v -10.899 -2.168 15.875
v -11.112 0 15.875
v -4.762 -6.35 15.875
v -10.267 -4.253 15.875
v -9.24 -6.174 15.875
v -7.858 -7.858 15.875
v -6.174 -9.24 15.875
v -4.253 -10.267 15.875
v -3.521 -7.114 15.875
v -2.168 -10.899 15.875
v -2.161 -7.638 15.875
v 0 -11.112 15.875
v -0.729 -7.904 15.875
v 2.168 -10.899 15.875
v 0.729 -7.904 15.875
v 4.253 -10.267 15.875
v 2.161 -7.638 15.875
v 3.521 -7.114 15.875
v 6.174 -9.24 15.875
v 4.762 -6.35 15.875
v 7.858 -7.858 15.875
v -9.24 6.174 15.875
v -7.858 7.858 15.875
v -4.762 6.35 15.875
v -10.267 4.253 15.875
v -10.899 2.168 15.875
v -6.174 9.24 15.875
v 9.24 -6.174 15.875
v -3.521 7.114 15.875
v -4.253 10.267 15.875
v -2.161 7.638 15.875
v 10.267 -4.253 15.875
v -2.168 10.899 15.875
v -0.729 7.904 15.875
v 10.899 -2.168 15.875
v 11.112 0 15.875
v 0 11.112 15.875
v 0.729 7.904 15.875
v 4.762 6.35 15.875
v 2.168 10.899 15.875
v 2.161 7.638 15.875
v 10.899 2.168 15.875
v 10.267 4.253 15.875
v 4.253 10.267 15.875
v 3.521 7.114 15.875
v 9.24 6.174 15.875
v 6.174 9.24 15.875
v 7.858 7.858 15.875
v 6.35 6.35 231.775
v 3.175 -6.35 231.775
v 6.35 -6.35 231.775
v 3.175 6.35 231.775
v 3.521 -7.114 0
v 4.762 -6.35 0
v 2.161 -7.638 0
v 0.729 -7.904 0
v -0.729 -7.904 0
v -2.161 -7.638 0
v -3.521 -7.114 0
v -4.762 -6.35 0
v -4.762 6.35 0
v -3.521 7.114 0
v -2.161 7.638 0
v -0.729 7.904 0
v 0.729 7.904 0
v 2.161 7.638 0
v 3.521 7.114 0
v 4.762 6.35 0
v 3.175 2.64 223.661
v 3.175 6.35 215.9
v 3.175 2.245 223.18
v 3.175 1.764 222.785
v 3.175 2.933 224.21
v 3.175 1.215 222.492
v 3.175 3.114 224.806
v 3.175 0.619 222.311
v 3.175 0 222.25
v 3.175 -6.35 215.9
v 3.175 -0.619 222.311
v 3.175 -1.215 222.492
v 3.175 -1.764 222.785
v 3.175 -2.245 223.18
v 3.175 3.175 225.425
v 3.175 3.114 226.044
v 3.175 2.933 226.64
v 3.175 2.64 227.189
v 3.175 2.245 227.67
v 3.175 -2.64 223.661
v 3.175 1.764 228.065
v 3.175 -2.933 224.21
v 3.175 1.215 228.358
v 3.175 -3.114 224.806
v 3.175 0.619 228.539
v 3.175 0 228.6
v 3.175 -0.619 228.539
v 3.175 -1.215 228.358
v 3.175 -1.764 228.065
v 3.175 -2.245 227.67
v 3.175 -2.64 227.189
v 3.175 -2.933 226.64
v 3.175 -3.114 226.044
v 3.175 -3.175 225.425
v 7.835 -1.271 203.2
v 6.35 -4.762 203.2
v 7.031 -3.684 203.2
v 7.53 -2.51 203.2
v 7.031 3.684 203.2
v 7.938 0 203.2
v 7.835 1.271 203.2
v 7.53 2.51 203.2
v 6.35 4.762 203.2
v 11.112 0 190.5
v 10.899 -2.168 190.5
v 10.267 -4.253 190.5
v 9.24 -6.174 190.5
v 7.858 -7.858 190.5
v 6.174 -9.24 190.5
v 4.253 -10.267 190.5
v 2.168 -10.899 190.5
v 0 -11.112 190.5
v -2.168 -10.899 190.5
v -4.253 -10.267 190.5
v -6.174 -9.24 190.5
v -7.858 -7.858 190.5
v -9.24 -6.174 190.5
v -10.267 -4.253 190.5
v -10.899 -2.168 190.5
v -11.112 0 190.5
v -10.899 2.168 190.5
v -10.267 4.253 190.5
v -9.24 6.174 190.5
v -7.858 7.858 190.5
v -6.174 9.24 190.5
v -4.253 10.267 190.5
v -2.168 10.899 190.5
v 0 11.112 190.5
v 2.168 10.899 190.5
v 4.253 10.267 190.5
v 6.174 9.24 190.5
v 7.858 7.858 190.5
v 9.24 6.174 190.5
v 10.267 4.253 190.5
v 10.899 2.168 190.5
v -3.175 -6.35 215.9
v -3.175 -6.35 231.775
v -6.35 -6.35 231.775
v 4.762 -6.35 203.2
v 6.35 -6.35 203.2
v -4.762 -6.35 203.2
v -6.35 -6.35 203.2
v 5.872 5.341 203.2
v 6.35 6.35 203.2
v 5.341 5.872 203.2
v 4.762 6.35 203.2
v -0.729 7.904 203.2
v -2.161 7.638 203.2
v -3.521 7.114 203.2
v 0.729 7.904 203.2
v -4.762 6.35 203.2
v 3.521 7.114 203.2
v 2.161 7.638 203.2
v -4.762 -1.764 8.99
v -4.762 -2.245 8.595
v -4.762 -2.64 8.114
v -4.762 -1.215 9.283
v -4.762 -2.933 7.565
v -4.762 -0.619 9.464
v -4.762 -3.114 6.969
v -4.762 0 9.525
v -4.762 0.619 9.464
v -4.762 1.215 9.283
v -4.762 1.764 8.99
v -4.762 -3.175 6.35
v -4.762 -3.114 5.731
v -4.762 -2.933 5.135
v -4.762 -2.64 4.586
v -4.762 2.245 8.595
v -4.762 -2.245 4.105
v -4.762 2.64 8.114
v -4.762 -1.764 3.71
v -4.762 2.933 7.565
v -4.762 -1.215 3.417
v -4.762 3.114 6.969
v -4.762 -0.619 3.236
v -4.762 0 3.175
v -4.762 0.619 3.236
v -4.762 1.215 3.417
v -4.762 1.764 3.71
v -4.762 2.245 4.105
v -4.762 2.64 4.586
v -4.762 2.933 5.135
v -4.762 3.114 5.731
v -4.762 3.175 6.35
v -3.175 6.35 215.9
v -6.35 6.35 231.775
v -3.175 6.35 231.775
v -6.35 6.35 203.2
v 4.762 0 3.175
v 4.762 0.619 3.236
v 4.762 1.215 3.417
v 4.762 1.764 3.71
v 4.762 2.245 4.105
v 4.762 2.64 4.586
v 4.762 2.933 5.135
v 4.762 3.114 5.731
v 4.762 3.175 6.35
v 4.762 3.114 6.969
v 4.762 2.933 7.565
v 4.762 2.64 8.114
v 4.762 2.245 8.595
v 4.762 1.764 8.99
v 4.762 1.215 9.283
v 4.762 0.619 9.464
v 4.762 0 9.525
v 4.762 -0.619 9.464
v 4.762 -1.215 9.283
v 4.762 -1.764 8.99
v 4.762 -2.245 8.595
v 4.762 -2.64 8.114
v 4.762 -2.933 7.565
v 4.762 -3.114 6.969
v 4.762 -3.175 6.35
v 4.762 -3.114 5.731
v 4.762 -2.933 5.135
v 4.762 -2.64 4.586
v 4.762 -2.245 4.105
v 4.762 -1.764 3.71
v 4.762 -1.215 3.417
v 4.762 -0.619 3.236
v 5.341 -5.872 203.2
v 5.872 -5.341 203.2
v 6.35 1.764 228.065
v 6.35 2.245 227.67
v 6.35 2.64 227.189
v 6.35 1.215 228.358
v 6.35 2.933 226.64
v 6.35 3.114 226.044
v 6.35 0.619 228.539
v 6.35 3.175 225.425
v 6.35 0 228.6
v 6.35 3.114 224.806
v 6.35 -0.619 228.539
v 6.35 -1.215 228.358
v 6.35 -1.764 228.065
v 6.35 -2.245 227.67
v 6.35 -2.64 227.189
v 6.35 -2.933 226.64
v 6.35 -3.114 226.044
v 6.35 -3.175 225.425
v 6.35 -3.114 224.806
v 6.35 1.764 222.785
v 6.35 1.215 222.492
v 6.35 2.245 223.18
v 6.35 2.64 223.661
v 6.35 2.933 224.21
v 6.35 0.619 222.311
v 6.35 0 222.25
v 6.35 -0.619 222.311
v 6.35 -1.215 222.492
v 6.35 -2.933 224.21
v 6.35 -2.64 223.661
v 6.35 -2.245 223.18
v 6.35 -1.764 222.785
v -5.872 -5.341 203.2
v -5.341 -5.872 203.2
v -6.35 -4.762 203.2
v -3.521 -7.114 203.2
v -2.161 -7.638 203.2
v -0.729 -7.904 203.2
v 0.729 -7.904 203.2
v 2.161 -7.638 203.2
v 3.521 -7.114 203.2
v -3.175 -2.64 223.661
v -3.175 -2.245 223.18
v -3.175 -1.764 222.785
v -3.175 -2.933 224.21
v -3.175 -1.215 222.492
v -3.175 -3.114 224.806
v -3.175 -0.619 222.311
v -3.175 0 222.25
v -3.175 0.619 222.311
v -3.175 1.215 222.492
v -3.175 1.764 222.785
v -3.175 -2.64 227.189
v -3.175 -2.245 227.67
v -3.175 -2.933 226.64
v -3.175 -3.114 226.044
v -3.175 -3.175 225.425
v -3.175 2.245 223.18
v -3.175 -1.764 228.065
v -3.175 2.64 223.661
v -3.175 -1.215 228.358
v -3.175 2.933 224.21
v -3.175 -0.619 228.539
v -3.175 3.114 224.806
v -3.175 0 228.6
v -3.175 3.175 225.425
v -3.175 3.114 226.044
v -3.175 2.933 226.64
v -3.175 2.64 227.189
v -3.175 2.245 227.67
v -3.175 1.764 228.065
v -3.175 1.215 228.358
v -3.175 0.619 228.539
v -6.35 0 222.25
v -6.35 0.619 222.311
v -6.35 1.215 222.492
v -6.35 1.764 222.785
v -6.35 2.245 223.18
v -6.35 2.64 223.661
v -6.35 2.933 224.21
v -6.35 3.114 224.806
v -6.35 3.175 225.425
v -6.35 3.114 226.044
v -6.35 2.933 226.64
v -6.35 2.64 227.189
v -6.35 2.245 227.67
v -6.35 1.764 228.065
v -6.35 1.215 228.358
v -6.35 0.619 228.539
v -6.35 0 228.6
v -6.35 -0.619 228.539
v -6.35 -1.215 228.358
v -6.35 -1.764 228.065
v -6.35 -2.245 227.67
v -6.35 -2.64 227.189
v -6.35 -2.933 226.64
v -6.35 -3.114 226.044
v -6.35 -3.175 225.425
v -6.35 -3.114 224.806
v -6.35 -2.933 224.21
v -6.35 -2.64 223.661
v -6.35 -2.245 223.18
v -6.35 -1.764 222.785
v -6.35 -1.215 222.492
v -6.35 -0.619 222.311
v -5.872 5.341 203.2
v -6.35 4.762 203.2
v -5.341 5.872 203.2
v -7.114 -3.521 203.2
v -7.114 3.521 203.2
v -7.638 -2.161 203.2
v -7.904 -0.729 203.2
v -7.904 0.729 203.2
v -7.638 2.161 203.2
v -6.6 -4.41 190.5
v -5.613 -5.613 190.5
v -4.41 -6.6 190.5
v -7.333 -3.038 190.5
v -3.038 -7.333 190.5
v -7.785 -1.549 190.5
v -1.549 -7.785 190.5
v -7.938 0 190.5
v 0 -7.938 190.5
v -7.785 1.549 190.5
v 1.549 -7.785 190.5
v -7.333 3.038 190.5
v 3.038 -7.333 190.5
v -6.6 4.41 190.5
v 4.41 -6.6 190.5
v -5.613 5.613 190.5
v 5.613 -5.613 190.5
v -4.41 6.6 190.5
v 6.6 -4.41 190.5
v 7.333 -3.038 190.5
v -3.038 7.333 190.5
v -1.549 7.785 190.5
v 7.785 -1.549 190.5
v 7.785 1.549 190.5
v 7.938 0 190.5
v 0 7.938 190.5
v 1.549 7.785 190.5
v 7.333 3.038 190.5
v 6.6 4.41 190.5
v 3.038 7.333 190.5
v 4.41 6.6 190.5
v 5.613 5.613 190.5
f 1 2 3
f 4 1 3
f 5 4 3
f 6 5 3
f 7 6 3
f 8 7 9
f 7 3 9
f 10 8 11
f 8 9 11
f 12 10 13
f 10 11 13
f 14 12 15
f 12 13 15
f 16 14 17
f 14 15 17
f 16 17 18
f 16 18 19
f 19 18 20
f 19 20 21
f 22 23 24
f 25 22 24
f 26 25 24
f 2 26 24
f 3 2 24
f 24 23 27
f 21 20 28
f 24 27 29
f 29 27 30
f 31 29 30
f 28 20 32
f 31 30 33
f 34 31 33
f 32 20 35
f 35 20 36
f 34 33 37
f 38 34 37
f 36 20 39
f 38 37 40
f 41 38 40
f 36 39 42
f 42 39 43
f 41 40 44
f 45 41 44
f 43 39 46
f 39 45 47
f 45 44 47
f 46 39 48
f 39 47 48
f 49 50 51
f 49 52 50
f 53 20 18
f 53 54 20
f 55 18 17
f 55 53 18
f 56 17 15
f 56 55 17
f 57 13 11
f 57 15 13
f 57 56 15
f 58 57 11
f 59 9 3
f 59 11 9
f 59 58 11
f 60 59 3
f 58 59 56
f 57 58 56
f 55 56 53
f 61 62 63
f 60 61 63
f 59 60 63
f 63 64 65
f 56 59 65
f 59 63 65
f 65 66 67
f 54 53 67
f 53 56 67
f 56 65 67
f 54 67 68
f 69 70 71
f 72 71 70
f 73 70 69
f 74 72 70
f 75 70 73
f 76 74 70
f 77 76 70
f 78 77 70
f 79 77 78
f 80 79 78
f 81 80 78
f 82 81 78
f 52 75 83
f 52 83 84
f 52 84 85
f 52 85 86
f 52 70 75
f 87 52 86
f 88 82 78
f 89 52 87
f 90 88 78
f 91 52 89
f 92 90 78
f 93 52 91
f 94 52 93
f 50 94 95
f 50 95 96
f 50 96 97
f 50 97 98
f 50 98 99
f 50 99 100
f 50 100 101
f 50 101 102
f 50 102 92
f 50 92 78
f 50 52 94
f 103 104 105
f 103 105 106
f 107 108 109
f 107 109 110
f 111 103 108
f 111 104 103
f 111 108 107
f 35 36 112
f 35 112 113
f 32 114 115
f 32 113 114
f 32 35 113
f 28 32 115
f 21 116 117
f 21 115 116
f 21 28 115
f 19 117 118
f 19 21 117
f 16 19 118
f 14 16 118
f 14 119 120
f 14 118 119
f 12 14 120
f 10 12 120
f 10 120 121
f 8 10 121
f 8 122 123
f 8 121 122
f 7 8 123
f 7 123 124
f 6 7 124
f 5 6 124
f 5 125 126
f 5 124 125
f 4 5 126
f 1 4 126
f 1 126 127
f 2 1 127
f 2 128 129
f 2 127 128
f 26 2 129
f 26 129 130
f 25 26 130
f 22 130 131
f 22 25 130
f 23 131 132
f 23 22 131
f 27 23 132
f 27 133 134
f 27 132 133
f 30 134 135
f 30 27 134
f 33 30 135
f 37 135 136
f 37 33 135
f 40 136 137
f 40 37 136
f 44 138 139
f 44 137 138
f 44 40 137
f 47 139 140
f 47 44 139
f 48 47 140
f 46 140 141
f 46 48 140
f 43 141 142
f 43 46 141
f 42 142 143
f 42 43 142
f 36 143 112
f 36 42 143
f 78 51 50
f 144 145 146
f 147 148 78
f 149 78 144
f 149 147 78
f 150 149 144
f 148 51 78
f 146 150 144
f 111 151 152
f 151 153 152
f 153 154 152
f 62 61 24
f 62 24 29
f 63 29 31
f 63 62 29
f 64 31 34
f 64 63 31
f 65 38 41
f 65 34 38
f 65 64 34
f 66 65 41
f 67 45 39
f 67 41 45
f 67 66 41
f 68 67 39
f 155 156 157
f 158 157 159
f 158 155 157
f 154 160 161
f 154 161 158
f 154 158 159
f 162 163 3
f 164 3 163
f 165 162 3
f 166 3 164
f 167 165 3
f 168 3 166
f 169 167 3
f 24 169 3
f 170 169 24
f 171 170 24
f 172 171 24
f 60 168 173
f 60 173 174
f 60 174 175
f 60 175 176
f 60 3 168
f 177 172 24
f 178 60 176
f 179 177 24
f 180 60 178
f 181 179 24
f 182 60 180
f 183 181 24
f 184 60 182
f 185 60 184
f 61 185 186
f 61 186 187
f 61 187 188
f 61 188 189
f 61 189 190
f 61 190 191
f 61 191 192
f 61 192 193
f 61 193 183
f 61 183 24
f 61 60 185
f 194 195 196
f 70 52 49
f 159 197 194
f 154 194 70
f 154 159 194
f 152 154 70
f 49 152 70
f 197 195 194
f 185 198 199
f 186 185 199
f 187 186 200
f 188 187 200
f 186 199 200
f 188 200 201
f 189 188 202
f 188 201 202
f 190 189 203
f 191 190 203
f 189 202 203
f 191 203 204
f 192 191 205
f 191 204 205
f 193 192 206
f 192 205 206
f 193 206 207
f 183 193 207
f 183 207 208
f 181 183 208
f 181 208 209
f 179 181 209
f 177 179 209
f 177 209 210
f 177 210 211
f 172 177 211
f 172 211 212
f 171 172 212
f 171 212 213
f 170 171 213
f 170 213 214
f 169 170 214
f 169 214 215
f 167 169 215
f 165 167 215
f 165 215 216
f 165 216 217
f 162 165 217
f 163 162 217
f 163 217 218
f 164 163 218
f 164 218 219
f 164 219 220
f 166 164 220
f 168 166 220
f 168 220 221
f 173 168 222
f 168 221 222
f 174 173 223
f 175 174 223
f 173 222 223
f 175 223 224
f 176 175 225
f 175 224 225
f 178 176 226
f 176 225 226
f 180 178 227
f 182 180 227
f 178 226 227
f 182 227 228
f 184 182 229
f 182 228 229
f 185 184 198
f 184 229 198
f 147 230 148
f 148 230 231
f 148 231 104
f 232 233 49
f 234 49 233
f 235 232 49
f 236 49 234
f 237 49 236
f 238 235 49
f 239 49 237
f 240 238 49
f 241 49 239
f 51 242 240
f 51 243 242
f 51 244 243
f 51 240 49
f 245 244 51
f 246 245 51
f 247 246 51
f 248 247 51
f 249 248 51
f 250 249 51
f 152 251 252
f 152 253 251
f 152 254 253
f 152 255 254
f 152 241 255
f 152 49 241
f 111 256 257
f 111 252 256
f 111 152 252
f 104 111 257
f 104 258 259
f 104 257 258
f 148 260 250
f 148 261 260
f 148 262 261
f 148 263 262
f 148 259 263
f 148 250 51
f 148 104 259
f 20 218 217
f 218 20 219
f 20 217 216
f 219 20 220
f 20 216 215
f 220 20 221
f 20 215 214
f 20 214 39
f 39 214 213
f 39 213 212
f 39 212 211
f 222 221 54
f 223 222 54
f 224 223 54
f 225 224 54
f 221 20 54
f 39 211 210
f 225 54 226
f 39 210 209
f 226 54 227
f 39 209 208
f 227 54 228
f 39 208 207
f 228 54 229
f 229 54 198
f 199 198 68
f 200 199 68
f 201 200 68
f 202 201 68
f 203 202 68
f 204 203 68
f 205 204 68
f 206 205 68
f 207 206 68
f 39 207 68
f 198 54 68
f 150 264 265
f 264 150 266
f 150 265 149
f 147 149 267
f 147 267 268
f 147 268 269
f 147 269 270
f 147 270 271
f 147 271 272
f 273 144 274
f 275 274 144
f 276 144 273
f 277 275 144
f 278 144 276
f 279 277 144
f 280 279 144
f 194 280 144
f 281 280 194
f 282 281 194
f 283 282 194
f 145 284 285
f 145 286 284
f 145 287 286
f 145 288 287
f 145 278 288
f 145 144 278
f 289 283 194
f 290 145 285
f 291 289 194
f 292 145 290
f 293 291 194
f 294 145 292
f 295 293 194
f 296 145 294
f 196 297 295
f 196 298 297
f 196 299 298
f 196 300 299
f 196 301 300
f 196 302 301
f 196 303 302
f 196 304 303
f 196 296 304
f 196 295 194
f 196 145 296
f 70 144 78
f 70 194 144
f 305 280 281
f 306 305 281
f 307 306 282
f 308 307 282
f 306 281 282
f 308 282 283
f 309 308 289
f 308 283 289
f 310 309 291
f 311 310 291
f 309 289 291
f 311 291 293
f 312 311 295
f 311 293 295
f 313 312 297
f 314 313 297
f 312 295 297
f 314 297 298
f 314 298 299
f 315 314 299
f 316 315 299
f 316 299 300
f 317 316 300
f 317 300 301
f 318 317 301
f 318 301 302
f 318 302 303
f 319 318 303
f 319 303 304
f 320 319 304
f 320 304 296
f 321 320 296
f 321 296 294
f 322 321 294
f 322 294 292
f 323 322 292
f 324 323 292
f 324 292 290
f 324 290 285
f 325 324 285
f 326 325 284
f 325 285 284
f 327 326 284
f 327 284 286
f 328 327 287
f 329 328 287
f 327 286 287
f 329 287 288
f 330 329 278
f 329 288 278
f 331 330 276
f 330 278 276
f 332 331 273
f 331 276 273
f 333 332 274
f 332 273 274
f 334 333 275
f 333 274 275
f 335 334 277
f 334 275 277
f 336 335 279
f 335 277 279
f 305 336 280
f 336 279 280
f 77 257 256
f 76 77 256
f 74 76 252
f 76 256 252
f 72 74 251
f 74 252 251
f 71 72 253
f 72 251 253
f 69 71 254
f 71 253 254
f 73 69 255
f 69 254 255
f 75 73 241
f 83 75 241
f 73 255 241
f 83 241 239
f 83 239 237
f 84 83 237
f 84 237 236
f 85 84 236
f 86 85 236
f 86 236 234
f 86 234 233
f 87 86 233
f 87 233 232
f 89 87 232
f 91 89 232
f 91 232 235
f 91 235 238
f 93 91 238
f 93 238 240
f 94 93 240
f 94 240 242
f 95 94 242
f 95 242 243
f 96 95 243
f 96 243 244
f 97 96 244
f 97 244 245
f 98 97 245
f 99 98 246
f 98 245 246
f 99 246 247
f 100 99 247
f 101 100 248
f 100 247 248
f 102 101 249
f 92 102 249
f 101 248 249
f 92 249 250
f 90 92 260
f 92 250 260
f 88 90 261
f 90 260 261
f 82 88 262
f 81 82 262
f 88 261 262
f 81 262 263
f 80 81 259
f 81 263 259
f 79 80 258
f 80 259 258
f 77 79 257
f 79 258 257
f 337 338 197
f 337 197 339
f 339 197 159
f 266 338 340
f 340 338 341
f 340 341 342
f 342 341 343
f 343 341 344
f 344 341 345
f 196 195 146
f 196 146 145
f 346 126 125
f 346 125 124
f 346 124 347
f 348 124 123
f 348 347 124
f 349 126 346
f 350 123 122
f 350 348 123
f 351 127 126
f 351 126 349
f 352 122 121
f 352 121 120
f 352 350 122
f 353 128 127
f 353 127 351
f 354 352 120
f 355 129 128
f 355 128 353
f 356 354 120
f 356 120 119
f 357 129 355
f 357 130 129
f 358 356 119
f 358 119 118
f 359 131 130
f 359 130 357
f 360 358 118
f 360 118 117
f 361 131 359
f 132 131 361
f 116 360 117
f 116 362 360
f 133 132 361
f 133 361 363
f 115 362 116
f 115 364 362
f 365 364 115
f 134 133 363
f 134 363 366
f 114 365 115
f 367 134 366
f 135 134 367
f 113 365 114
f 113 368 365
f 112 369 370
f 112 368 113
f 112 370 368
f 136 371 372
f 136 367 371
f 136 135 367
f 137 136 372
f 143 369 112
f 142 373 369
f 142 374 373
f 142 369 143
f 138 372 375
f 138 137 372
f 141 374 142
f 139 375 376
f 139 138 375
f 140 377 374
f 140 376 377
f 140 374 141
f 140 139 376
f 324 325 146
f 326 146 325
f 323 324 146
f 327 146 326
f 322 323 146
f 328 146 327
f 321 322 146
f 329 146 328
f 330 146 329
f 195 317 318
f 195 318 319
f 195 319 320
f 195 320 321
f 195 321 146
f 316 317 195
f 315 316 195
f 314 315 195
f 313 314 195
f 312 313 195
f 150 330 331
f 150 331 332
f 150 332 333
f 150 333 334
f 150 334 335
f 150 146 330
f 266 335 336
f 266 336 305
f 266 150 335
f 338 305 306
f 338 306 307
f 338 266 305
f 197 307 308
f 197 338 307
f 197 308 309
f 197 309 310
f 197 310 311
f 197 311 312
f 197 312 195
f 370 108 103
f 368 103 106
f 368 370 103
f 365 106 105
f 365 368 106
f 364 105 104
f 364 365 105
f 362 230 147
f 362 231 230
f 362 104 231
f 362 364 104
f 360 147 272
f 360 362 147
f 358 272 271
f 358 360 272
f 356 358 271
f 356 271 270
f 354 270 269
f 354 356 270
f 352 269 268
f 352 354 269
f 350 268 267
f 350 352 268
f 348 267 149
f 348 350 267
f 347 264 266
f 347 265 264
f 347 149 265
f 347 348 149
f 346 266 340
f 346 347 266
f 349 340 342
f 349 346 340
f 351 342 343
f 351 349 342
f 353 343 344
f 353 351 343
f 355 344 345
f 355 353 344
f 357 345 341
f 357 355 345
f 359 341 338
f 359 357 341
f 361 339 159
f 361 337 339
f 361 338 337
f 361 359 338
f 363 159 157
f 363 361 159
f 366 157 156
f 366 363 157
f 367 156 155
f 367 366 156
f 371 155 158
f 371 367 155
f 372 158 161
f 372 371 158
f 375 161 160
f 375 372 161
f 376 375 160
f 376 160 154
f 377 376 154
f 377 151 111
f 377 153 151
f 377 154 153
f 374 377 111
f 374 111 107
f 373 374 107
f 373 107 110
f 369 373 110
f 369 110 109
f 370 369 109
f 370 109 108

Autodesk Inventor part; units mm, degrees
ref_plane "YZ Plane" through (0, 0, 0) normal (1, 0, 0) x (0, 1, 0)
ref_plane "XZ Plane" through (0, 0, 0) normal (0, 1, 0) x (-1, 0, 0)
ref_plane "XY Plane" through (0, 0, 0) normal (0, 0, 1) x (1, 0, 0)
sketch "Sketch1" plane through (0, 0, 0) normal (0, 0, 1) x (1, 0, 0)
  circle A0 centre (0, 0) radius 7.9375
  dimension "d0" = 15.875
extrude "Extrusion1" add sketch "Sketch1" along normal blind 15.875
sketch "Sketch2" plane through (0, 0, 15.875) normal (0, 0, 1) x (1, 0, 0)
  circle A0 centre (0, 0) radius 11.1125
  dimension "d3" = 22.225
extrude "Extrusion2" add sketch "Sketch2" along normal blind 174.625
sketch "Sketch3" plane through (0, 0, 190.5) normal (0, 0, 1) x (1, 0, 0)
  circle A0 centre (0, 0) radius 7.9375 projected
extrude "Extrusion3" add sketch "Sketch3" along normal blind 12.7
sketch "Sketch4" plane through (0, 0, 0) normal (0, 0, -1) x (-1, 0, 0)
  line L0 (-4.7625, 0) -> (4.7625, 0) construction
  line L1 (-4.7625, 14.2513) -> (-13.4248, 14.2513)
  line L2 (-13.4248, 14.2513) -> (-13.4248, -14.2513)
  line L3 (-13.4248, -14.2513) -> (-4.7625, -14.2513)
  line L4 (-4.7625, -14.2513) -> (-4.7625, 14.2513)
  line L5 (4.7625, 14.2513) -> (11.8991, 14.2513)
  line L6 (11.8991, 14.2513) -> (11.8991, -14.2513)
  line L7 (11.8991, -14.2513) -> (4.7625, -14.2513)
  line L8 (4.7625, -14.2513) -> (4.7625, 14.2513)
  point P0 (0, 0)
  point P1 (0, 0)
  dimension "d8" = 9.525
extrude "Extrusion4" cut sketch "Sketch4" against normal up to surface (15.875 mm away)
sketch "Sketch5" plane through (4.7625, -6.35, 0) normal (1, 0, 0) x (0, 0, -1)
  line L0 (0, 6.35) -> (-6.35, 6.35) construction
  circle A0 centre (-6.35, 6.35) radius 3.175
  dimension "d11" = 6.35
  dimension "d12" = 6.35
extrude "Extrusion5" cut sketch "Sketch5" against normal through all
sketch "Sketch6" plane through (0, 0, 203.2) normal (0, 0, 1) x (1, 0, 0)
  line L0 (-6.35, 6.35) -> (6.35, 6.35)
  line L1 (6.35, 6.35) -> (6.35, -6.35)
  line L2 (6.35, -6.35) -> (-6.35, -6.35)
  line L3 (-6.35, -6.35) -> (-6.35, 6.35)
  line L4 (0, 0) -> (0, 6.35) construction
  line L5 (0, 0) -> (-6.35, 0) construction
  dimension "d15" = 12.7
extrude "Extrusion6" add sketch "Sketch6" along normal blind 28.575
sketch "Sketch7" plane through (0, 0, 231.775) normal (0, 0, 1) x (1, 0, 0)
  line L0 (-4.7625, 6.35) -> (4.7625, 6.35) projected
  line L1 (4.7625, -6.35) -> (-4.7625, -6.35) projected
  line L2 (-3.175, 6.35) -> (3.175, 6.35)
  line L3 (3.175, 6.35) -> (3.175, -6.35)
  line L4 (3.175, -6.35) -> (-3.175, -6.35)
  line L5 (-3.175, -6.35) -> (-3.175, 6.35)
  line L6 (-3.175, 0) -> (3.175, 0) construction
  point P0 (0, 0)
  point P1 (0, 0)
  dimension "d18" = 6.35
extrude "Extrusion7" cut sketch "Sketch7" against normal blind 15.875
sketch "Sketch8" plane through (6.35, 4.7625, 203.2) normal (1, 0, 0) x (0, 0, -1)
  line L0 (-28.575, -11.1125) -> (-28.575, 1.5875) construction
  line L1 (-28.575, -4.7625) -> (-22.225, -4.7625) construction
  circle A0 centre (-22.225, -4.7625) radius 3.175
  point P0 (203.2, -4.7625)
  dimension "d21" = 6.35
  dimension "d22" = 6.35
extrude "Extrusion8" cut sketch "Sketch8" against normal through all
thread "Thread1" size "5/8-11 UNC" class "2A" standard "ANSI Unified Screw Threads" length 9.525 offset 3.175
thread "Thread2" size "5/8-11 UNC" class "2A" standard "ANSI Unified Screw Threads" full length
thread "Thread3" size "5/8-11 UNC" class "2A" standard "ANSI Unified Screw Threads" full length
properties part number "4in stroke cylinder"
